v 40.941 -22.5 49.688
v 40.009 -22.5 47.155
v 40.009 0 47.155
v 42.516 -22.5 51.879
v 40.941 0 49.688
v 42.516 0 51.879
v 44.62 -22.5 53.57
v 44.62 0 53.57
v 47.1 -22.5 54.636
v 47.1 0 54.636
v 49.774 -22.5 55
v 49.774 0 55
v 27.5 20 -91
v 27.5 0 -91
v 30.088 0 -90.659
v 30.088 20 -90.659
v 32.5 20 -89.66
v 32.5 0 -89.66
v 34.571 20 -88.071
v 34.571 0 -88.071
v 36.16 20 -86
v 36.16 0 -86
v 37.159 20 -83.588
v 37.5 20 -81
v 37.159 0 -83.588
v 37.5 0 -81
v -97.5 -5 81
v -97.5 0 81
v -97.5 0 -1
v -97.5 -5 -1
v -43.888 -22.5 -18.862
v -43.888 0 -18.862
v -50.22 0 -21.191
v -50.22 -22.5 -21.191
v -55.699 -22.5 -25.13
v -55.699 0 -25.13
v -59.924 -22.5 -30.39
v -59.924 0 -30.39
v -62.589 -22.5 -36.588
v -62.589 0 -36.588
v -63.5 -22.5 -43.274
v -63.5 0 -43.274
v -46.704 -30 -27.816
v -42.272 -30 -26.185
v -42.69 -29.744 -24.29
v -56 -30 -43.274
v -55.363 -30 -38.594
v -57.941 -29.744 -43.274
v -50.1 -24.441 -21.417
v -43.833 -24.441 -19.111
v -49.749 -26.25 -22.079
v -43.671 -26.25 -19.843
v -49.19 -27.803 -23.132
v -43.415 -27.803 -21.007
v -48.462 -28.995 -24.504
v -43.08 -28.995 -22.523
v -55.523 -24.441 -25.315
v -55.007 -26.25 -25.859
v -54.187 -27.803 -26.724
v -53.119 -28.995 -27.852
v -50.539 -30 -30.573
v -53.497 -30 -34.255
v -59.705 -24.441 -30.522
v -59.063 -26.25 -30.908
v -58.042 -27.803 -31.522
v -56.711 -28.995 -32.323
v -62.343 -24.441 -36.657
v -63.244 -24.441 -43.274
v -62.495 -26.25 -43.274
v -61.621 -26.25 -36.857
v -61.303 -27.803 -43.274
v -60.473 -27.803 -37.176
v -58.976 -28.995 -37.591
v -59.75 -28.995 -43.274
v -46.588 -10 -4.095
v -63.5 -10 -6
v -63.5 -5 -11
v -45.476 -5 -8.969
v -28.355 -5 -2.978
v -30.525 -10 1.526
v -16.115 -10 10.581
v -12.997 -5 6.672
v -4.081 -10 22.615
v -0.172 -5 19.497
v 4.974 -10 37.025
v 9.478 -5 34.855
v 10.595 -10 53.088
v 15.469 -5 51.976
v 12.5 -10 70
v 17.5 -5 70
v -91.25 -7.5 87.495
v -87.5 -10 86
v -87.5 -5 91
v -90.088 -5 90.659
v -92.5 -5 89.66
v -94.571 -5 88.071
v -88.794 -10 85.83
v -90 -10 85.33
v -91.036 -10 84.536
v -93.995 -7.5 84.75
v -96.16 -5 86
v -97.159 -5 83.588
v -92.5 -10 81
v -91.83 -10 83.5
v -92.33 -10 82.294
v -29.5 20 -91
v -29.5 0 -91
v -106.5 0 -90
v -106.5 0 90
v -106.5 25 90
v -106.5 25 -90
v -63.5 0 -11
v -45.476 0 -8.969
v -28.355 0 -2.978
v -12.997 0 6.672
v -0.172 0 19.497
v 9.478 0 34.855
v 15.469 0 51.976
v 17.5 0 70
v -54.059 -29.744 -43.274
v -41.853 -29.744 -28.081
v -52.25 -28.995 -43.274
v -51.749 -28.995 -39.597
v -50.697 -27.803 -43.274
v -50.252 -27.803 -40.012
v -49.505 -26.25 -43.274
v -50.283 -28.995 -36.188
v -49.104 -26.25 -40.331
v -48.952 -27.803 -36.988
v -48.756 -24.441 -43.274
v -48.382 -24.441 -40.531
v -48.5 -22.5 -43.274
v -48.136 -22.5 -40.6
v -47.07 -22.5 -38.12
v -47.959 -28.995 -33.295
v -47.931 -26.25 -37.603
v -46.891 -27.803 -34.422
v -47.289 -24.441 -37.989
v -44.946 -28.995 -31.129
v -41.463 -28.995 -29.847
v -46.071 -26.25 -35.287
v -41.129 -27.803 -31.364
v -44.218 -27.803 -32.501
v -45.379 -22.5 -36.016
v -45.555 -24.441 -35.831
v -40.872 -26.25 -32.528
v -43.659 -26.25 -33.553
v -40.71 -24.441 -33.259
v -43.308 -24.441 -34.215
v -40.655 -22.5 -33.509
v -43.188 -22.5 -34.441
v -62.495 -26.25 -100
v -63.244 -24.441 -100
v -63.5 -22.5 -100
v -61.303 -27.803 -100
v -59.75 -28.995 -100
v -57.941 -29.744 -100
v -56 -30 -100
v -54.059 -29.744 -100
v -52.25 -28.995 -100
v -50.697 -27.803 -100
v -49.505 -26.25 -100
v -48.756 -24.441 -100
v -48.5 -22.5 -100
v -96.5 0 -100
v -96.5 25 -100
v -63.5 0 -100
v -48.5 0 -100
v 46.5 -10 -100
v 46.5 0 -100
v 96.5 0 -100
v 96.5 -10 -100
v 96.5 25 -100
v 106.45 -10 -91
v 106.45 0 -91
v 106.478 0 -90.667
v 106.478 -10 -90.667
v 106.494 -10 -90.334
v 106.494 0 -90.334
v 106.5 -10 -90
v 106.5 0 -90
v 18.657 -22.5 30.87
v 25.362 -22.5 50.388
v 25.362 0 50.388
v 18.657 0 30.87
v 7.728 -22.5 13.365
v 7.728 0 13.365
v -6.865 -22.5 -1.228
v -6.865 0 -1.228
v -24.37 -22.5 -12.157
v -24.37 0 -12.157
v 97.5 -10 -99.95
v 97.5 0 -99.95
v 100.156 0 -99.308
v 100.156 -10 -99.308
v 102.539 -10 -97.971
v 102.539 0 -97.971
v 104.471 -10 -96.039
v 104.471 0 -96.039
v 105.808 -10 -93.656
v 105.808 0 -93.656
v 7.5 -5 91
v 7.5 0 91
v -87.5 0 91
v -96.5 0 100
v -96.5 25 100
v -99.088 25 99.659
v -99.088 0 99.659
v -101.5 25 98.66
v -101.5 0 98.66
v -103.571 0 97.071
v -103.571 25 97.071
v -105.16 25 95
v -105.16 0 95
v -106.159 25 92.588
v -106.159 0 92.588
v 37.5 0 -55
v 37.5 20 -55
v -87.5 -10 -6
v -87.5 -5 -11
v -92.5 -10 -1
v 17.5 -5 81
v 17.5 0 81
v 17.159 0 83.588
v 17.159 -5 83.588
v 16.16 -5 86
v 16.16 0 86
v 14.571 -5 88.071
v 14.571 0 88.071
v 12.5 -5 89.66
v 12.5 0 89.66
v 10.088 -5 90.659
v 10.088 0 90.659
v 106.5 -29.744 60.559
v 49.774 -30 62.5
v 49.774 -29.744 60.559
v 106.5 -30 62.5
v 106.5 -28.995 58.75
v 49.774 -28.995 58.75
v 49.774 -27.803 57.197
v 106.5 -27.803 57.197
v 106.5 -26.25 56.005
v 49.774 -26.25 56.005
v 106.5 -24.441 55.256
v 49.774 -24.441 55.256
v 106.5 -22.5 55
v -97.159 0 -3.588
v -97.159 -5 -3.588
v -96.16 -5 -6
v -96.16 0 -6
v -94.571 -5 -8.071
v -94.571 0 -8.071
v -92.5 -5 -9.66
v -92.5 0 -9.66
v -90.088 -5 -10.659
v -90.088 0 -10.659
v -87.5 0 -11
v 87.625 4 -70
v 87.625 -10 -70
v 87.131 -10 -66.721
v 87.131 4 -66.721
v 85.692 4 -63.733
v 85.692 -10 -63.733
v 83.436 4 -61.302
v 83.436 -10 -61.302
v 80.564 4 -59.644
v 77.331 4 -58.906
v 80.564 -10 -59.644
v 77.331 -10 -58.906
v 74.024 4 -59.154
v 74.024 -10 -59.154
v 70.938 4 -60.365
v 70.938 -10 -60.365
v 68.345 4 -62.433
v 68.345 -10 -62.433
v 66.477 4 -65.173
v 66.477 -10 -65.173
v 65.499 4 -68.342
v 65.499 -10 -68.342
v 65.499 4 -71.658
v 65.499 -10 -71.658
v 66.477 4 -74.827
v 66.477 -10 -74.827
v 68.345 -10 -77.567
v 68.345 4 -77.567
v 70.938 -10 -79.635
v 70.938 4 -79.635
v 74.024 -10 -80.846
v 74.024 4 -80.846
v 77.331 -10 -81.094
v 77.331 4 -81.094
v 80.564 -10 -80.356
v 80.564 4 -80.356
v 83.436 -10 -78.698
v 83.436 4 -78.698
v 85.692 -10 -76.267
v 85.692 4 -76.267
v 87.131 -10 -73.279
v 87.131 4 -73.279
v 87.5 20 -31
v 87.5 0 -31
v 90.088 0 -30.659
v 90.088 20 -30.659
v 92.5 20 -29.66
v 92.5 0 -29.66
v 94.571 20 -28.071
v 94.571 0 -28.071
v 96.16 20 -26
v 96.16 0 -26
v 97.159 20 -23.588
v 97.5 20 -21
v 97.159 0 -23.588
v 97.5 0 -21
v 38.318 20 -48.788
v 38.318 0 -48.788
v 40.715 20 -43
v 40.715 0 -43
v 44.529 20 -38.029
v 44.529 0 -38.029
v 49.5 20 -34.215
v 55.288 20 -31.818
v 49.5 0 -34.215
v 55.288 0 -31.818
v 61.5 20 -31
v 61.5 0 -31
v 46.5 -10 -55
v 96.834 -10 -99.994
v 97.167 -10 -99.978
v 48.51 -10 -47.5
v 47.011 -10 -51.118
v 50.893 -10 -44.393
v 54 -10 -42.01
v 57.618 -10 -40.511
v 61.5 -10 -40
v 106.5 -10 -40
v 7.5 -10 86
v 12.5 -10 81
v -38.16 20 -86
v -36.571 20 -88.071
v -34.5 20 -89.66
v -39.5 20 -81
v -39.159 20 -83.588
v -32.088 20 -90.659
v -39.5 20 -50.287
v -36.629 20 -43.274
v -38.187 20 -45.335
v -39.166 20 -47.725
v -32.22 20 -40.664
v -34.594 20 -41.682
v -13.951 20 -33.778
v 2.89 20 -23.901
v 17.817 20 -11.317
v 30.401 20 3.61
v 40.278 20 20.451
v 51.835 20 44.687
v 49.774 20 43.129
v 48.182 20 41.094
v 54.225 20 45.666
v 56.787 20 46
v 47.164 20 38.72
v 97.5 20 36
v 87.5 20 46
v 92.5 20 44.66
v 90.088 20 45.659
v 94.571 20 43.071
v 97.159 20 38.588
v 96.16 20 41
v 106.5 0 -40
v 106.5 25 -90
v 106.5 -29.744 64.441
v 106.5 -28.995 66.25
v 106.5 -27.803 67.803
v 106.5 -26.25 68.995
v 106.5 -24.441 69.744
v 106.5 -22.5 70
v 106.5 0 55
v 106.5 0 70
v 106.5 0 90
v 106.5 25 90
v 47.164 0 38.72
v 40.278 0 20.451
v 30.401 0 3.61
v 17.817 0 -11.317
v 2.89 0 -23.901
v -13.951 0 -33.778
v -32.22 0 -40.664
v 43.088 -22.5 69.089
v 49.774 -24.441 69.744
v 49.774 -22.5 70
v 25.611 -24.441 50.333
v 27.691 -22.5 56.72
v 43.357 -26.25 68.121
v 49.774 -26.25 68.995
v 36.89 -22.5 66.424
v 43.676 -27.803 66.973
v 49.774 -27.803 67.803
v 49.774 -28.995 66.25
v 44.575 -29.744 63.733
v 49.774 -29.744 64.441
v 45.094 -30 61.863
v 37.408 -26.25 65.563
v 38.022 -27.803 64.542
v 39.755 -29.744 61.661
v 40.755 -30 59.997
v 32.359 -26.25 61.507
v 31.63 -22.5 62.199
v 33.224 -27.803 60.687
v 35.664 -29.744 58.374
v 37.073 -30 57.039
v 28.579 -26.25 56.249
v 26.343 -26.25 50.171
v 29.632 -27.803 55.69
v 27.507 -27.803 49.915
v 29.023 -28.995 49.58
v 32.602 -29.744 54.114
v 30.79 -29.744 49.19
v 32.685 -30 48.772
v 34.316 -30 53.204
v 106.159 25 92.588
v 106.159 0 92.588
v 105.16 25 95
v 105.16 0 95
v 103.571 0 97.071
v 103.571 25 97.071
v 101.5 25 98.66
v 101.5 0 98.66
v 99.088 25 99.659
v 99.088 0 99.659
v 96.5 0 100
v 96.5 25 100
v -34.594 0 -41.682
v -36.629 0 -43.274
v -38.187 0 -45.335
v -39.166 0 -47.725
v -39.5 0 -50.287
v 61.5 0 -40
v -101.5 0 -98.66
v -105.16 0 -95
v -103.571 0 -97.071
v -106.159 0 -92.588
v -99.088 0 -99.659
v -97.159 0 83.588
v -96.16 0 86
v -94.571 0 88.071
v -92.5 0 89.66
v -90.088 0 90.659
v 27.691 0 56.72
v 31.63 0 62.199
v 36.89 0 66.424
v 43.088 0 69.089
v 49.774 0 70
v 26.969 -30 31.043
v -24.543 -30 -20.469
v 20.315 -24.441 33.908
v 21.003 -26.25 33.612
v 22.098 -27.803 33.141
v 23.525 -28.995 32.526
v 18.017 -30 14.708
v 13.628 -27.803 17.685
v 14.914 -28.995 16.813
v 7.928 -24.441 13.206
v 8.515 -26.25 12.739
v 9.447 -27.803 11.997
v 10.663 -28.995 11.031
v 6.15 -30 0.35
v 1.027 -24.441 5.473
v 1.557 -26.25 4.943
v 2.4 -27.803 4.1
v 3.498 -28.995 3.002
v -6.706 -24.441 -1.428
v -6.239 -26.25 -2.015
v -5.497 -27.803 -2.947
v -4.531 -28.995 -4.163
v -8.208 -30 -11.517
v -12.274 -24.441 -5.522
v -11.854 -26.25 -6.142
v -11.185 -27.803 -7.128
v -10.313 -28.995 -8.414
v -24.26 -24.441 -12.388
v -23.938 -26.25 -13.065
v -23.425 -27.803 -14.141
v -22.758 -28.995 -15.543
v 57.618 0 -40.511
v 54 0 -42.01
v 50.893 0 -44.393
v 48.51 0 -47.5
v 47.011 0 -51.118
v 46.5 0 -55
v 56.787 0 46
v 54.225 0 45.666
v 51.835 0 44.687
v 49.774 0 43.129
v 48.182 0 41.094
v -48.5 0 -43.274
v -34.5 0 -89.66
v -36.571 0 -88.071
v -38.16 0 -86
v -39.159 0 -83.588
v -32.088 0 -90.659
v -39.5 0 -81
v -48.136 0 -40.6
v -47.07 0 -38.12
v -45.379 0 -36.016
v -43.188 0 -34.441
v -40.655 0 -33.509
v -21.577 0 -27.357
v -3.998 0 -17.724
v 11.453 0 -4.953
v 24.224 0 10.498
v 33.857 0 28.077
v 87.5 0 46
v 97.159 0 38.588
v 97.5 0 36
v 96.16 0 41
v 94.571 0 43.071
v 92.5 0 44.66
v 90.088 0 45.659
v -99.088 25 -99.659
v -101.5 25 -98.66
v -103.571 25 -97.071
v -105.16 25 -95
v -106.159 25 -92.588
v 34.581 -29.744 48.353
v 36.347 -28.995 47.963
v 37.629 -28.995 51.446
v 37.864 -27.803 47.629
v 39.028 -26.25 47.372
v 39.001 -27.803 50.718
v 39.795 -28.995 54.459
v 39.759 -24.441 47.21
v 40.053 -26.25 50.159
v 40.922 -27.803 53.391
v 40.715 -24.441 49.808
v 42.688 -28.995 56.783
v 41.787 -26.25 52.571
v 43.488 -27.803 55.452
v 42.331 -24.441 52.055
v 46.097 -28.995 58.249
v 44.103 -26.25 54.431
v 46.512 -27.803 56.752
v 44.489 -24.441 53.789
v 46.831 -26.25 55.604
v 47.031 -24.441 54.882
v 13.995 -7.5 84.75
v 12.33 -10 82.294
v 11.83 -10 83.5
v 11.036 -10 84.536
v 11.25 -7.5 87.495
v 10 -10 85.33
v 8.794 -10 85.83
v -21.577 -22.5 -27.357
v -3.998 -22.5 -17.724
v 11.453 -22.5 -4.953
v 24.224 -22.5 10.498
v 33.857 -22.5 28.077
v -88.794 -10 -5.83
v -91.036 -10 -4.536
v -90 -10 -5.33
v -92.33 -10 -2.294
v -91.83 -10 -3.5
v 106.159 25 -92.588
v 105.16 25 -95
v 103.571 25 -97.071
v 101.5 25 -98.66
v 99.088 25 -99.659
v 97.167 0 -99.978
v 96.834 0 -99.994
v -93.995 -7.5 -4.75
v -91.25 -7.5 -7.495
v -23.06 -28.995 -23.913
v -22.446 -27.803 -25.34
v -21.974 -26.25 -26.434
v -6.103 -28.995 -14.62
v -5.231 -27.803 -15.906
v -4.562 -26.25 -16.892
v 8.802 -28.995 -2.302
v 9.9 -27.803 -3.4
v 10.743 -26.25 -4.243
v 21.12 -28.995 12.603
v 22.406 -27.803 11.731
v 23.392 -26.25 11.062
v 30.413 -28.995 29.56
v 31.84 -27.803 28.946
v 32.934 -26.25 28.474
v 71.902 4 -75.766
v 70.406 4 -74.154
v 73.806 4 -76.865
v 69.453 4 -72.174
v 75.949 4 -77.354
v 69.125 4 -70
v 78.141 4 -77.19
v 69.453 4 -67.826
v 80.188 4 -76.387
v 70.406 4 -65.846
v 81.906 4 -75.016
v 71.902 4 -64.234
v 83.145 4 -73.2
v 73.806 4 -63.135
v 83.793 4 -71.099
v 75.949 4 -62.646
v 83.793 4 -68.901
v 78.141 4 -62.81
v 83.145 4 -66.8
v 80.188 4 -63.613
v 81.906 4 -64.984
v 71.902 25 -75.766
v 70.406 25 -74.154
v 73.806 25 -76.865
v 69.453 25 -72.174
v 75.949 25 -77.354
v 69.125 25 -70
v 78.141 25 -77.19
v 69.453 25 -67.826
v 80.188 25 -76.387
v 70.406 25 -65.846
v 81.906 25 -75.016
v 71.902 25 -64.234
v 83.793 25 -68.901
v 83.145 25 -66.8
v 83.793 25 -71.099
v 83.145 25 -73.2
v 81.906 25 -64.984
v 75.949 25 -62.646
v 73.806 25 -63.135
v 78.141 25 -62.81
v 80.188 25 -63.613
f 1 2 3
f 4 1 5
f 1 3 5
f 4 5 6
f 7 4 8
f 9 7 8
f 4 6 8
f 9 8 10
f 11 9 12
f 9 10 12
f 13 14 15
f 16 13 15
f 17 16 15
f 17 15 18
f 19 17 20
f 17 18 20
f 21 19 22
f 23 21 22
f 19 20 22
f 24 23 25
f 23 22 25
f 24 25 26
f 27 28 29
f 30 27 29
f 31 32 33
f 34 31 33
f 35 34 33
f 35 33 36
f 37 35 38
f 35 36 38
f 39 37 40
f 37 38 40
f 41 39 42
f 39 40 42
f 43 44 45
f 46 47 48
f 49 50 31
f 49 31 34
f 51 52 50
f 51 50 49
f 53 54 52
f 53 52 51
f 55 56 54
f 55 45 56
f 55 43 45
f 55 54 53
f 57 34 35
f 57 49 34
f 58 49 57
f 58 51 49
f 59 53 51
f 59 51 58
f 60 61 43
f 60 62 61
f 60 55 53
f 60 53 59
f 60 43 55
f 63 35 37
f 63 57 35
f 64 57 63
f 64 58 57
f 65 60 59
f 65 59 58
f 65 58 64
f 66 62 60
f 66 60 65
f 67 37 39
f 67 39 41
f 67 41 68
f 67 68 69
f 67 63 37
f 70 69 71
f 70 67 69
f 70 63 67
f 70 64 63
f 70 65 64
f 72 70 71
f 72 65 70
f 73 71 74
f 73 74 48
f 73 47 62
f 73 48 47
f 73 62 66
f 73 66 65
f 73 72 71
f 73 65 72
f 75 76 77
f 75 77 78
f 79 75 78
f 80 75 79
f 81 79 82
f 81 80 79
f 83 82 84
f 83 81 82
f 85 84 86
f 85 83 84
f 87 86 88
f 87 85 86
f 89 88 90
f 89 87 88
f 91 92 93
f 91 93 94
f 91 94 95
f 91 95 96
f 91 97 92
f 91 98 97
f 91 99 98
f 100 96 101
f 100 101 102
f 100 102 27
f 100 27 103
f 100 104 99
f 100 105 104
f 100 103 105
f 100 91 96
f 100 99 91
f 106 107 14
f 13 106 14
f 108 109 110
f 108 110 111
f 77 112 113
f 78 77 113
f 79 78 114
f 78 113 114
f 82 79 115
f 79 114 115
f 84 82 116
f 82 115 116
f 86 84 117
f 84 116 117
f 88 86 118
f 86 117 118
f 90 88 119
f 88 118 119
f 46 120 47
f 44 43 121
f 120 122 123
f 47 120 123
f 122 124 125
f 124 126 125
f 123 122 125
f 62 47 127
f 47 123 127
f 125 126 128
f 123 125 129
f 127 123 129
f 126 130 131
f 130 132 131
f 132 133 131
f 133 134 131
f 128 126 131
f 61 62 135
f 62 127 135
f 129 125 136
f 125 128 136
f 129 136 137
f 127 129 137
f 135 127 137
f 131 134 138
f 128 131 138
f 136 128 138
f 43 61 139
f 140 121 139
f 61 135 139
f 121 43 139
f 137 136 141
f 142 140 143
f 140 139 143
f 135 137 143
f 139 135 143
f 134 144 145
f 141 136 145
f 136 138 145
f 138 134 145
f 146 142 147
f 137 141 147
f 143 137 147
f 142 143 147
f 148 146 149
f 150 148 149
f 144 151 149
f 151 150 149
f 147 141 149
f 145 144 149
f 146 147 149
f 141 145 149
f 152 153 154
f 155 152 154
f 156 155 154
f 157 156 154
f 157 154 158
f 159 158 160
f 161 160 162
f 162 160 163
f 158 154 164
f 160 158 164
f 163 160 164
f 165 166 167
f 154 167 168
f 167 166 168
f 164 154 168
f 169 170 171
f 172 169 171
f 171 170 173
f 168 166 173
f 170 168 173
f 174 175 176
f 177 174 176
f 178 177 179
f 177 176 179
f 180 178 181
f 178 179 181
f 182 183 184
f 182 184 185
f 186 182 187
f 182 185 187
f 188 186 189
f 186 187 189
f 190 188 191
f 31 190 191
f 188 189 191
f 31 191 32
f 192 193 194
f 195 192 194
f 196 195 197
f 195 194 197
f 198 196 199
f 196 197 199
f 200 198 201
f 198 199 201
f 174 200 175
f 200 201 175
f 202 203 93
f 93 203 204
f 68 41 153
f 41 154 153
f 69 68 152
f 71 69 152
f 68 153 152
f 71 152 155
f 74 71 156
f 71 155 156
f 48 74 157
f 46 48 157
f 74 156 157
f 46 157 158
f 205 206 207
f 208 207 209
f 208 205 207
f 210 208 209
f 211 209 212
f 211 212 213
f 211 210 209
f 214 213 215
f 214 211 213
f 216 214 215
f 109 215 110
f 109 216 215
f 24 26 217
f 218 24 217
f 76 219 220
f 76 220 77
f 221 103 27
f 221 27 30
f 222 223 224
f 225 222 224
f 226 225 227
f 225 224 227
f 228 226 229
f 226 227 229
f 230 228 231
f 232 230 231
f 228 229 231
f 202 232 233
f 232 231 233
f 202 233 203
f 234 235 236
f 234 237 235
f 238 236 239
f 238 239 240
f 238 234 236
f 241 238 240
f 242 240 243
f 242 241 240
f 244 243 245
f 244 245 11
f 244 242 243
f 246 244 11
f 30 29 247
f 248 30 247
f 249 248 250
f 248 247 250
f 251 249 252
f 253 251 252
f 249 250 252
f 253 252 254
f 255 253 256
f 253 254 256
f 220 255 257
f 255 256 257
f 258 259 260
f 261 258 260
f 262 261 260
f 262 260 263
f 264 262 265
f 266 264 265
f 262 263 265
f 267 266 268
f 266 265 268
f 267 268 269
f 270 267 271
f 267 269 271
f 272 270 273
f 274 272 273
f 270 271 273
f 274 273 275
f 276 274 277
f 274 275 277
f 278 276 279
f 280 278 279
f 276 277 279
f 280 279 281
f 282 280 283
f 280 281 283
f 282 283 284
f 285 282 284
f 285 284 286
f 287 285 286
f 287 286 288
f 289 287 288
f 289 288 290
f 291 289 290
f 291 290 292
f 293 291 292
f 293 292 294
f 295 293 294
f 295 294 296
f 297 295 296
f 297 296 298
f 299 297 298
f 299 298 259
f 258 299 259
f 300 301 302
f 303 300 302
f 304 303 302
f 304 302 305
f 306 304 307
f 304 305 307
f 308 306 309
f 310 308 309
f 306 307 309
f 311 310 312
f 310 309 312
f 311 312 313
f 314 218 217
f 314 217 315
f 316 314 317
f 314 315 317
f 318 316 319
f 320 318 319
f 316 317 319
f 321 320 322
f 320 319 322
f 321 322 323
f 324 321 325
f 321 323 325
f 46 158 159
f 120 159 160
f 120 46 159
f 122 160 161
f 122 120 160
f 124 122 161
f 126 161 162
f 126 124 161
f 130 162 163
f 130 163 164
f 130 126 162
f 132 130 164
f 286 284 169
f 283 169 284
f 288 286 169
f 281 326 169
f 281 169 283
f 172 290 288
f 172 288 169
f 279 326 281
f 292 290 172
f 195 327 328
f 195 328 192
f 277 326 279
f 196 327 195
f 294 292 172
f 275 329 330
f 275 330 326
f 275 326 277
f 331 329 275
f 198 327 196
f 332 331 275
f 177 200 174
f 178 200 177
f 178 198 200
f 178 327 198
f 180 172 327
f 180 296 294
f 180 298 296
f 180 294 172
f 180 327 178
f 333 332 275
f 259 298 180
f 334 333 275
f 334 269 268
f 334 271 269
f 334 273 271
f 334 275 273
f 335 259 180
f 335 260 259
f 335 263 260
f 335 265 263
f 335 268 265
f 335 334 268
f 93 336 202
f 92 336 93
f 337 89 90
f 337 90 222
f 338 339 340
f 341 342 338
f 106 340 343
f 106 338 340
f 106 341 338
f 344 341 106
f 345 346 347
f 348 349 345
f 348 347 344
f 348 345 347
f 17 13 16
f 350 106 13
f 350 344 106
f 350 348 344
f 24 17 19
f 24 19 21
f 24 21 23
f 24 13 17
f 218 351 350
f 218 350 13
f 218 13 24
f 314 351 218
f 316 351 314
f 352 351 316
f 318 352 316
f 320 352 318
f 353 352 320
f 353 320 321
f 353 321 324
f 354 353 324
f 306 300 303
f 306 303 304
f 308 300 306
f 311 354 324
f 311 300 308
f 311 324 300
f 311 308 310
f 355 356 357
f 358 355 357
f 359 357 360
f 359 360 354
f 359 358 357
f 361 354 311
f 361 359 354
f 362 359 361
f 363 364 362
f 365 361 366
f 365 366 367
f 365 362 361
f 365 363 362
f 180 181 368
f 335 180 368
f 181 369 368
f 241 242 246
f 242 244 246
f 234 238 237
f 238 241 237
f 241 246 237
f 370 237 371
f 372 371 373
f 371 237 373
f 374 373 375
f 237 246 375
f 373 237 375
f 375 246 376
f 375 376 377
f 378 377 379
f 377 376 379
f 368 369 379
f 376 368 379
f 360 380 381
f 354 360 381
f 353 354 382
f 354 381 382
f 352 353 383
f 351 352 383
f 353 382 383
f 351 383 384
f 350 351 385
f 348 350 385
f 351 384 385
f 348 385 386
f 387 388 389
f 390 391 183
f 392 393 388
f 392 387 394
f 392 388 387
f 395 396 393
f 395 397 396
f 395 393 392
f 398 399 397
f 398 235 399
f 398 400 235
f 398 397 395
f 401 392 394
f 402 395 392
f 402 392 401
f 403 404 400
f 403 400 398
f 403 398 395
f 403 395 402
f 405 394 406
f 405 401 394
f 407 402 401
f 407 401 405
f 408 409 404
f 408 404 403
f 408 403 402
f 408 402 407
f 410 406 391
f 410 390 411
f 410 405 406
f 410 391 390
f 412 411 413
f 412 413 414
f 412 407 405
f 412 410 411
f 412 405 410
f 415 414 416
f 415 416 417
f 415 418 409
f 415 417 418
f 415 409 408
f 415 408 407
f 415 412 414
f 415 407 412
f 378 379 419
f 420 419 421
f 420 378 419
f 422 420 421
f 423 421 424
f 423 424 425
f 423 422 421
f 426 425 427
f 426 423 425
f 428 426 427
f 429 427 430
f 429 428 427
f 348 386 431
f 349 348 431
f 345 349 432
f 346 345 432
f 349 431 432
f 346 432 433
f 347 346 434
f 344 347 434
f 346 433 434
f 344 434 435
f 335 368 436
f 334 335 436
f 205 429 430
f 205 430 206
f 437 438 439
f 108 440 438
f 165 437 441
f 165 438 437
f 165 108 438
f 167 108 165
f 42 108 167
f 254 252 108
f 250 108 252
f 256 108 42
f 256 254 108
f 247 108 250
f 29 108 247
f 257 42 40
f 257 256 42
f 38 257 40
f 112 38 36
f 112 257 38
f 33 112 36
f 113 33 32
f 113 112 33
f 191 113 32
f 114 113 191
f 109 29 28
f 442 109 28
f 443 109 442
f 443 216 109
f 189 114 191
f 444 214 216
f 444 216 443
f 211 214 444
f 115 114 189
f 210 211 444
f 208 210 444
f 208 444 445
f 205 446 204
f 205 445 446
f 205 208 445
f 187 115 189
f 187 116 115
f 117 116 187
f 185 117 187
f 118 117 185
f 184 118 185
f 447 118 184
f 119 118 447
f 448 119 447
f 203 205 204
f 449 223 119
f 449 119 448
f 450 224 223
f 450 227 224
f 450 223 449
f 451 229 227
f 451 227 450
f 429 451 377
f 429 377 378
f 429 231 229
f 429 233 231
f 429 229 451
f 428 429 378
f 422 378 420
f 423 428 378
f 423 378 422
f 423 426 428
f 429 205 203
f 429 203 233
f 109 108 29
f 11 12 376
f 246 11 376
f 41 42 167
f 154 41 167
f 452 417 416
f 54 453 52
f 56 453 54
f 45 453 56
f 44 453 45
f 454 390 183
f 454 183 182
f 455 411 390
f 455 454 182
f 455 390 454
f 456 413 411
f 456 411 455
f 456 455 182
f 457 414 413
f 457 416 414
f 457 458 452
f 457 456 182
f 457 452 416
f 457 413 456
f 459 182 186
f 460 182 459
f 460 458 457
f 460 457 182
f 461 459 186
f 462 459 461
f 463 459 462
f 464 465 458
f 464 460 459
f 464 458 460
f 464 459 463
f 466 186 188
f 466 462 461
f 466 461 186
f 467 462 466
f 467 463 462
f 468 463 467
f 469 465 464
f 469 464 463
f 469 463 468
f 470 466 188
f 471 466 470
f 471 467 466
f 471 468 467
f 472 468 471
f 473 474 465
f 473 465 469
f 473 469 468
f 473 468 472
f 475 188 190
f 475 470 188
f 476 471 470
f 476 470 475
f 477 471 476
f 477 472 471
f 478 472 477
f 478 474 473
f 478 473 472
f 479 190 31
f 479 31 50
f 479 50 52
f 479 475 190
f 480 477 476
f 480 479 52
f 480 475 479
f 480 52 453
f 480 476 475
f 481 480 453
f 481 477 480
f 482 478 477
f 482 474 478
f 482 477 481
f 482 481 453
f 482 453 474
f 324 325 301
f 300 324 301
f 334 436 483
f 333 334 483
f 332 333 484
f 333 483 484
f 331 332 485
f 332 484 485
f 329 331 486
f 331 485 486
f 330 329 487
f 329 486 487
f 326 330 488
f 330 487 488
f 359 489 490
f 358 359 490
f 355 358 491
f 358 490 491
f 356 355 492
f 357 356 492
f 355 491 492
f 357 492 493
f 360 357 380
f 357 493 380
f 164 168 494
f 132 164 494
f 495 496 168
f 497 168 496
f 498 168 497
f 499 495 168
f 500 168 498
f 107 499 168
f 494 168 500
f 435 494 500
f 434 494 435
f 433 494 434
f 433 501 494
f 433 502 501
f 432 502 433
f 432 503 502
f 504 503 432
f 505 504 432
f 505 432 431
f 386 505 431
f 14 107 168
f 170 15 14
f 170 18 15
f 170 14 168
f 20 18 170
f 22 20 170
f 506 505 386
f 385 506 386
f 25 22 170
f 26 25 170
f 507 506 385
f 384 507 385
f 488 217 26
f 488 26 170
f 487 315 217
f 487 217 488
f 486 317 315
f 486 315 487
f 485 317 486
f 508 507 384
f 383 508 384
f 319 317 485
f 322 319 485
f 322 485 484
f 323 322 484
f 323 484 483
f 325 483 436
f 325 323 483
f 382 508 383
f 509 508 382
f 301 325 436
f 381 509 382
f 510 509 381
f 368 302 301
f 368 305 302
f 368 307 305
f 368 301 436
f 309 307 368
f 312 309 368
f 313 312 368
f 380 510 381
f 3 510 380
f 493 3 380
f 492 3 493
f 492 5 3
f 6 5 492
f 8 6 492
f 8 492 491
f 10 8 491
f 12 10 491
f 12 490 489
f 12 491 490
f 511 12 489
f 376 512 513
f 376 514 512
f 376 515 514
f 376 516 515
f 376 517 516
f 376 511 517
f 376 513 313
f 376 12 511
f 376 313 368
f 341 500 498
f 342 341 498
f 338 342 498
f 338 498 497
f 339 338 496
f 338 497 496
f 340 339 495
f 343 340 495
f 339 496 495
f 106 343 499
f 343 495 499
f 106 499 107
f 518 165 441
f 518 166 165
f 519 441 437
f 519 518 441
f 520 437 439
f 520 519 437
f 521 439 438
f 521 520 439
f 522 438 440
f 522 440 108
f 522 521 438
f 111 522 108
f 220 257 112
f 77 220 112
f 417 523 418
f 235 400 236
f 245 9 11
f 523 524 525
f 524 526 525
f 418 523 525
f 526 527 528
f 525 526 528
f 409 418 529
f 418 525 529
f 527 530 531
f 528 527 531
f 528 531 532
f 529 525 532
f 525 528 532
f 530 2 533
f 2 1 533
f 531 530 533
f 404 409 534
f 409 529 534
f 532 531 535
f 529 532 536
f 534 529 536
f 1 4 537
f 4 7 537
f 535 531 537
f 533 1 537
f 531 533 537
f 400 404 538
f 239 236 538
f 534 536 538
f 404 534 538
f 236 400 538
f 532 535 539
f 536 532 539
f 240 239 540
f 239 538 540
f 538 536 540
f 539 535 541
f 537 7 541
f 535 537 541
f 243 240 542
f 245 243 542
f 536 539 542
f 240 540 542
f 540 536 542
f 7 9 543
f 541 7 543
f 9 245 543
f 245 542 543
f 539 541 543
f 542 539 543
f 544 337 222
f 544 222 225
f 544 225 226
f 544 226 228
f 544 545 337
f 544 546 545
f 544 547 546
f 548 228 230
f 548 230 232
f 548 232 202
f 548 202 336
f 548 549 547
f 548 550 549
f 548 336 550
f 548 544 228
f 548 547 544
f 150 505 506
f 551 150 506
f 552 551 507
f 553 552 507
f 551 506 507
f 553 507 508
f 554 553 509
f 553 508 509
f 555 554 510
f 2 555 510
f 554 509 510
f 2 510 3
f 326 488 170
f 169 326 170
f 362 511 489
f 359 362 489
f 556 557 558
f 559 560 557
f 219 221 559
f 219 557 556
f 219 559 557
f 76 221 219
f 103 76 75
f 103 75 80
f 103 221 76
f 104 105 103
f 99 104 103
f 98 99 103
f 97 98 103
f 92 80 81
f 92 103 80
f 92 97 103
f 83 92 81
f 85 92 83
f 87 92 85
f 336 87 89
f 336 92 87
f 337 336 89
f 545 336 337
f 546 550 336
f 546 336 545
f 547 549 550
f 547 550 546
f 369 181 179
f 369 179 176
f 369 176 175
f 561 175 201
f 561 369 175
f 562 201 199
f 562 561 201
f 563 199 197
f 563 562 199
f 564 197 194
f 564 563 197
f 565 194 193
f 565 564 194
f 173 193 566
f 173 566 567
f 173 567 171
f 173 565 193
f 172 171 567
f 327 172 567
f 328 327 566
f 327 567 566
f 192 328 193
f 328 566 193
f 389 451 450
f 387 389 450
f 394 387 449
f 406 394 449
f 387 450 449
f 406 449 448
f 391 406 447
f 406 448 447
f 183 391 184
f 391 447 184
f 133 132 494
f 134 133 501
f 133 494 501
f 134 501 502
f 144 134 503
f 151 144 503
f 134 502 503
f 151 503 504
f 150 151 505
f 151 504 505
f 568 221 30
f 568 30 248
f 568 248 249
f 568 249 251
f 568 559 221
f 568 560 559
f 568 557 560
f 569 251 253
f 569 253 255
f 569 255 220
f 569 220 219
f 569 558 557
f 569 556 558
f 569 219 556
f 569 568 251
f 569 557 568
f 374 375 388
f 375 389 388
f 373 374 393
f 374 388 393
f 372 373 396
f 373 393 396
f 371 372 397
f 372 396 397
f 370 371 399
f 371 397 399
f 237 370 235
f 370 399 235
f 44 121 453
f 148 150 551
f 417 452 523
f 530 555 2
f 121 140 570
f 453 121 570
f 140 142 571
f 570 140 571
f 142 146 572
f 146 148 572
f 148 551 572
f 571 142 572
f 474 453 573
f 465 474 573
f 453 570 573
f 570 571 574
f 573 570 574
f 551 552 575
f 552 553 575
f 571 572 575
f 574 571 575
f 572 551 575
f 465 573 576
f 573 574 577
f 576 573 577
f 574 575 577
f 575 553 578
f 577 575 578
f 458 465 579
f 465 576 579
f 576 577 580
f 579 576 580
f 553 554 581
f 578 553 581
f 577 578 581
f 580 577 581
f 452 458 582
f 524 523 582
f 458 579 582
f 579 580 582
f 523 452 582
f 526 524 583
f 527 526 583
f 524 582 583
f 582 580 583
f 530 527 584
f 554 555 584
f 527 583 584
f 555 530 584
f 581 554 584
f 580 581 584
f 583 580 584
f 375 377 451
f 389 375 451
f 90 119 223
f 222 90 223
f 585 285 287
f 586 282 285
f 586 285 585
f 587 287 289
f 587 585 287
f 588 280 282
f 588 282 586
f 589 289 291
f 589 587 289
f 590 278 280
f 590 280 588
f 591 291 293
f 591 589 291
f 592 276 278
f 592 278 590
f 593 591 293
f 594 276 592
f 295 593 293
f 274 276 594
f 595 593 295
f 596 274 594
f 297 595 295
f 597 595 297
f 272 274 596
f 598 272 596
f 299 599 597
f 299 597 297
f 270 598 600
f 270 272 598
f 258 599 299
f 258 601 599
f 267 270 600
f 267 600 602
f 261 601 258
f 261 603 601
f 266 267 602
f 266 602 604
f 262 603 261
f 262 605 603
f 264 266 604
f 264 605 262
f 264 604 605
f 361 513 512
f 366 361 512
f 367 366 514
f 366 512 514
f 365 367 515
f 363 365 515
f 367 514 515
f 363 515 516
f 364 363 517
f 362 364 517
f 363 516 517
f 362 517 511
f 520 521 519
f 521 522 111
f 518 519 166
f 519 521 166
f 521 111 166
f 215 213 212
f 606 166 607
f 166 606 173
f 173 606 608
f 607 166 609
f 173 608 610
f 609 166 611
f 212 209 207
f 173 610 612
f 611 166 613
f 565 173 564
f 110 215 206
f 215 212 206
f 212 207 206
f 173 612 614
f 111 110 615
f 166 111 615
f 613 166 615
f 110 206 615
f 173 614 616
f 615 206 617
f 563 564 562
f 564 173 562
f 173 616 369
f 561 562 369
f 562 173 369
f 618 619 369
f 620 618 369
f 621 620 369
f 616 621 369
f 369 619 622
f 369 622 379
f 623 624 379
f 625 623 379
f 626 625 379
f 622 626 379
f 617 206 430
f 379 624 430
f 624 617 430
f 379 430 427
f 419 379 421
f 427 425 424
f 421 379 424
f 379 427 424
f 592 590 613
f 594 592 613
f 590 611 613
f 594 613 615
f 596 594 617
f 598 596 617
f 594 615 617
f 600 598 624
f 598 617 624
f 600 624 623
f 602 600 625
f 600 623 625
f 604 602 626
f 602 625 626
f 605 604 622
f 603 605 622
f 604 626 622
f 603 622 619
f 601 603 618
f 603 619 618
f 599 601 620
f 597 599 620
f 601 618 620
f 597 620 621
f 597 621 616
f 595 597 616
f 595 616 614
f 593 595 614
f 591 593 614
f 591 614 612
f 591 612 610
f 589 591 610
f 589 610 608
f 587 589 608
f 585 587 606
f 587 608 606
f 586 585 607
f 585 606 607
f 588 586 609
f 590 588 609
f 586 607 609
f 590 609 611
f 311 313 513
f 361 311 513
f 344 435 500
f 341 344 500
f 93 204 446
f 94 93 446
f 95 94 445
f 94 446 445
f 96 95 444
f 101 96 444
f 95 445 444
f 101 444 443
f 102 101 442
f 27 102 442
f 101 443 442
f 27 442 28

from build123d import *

# Parameters (mm, degrees)
F1_DEPTH        = 25
F2_DEPTH        = 10
F3_DEPTH        = 20
F4_DEPTH        = 30
F5_R            = 7.49999
F6_SIZE         = 5
F7_R            = 10
F8_DEPTH        = 10
F10_D           = 14.75
F10_CBORE_D     = 22.25
F10_CBORE_DEPTH = 14


# Not quite as in the source:
# - a fillet or chamfer is up to 0.001 mm smaller than in the source, because OpenCascade refuses the exact size


with BuildPart() as f1:
    # F0 (on Front) → F1 (new body)
    with BuildSketch(Plane.XZ):
        with BuildLine():
            Line((96.5, 100), (-96.5, 100))
            ThreePointArc((-96.5, 100), (-103.5710678119, 97.0710678119), (-106.5, 90))
            Line((-106.5, 90), (-106.5, -90))
            ThreePointArc((-106.5, -90), (-103.5710678119, -97.0710678119), (-96.5, -100))
            Line((-96.5, -100), (-63.5, -100))
            Line((-63.5, -100), (-63.5, -43.2740040786))
            ThreePointArc((-63.5, -43.2740040786), (-57.9897187751, -27.6167098657), (-43.8879310345, -18.8615031996))
            ThreePointArc((-43.8879310345, -18.8615031996), (0.846717088, 5.653282912), (25.3615031996, 50.3879310345))
            ThreePointArc((25.3615031996, 50.3879310345), (34.1167098657, 64.4897187751), (49.7740040786, 70))
            Line((49.7740040786, 70), (106.5, 70))
            Line((106.5, 70), (106.5, 90))
            ThreePointArc((106.5, 90), (103.5710678119, 97.0710678119), (96.5, 100))
        make_face()
        with BuildLine():
            ThreePointArc((17.5, 70), (-6.2243507239, 12.7243507239), (-63.5, -11))
            Line((-63.5, -11), (-87.5, -11))
            ThreePointArc((-87.5, -11), (-94.5710678119, -8.0710678119), (-97.5, -1))
            Line((-97.5, -1), (-97.5, 81))
            ThreePointArc((-97.5, 81), (-94.5710678119, 88.0710678119), (-87.5, 91))
            Line((-87.5, 91), (7.5, 91))
            ThreePointArc((7.5, 91), (14.5710678119, 88.0710678119), (17.5, 81))
            Line((17.5, 81), (17.5, 70))
        make_face(mode=Mode.SUBTRACT)
        with BuildLine():
            ThreePointArc((-96.5, -100), (-103.5710678119, -97.0710678119), (-106.5, -90))
            Line((-106.5, -90), (-106.5, -100))
            Line((-106.5, -100), (-96.5, -100))
        make_face()
        with BuildLine():
            Line((106.5, 55), (106.5, 70))
            Line((106.5, 70), (49.7740040786, 70))
            ThreePointArc((49.7740040786, 70), (34.1167098657, 64.4897187751), (25.3615031996, 50.3879310345))
            ThreePointArc((25.3615031996, 50.3879310345), (0.846717088, 5.653282912), (-43.8879310345, -18.8615031996))
            ThreePointArc((-43.8879310345, -18.8615031996), (-57.9897187751, -27.6167098657), (-63.5, -43.2740040786))
            Line((-63.5, -43.2740040786), (-63.5, -100))
            Line((-63.5, -100), (-48.5, -100))
            Line((-48.5, -100), (-48.5, -43.2740040786))
            ThreePointArc((-48.5, -43.2740040786), (-46.29588751, -37.0110863935), (-40.6551724138, -33.509003727))
            ThreePointArc((-40.6551724138, -33.509003727), (11.4533188058, -4.9533188058), (40.009003727, 47.1551724138))
            ThreePointArc((40.009003727, 47.1551724138), (43.5110863935, 52.79588751), (49.7740040786, 55))
            Line((49.7740040786, 55), (106.5, 55))
        make_face()
        with BuildLine():
            Line((106.5, -40), (106.5, 55))
            Line((106.5, 55), (49.7740040786, 55))
            ThreePointArc((49.7740040786, 55), (43.5110863935, 52.79588751), (40.009003727, 47.1551724138))
            ThreePointArc((40.009003727, 47.1551724138), (11.4533188058, -4.9533188058), (-40.6551724138, -33.509003727))
            ThreePointArc((-40.6551724138, -33.509003727), (-46.29588751, -37.0110863935), (-48.5, -43.2740040786))
            Line((-48.5, -43.2740040786), (-48.5, -100))
            Line((-48.5, -100), (46.5, -100))
            Line((46.5, -100), (46.5, -55))
            ThreePointArc((46.5, -55), (50.8933982822, -44.3933982822), (61.5, -40))
            Line((61.5, -40), (106.5, -40))
        make_face()
        with BuildLine():
            Line((56.7871564216, 46), (87.5, 46))
            ThreePointArc((87.5, 46), (94.5710678119, 43.0710678119), (97.5, 36))
            Line((97.5, 36), (97.5, -21))
            ThreePointArc((97.5, -21), (94.5710678119, -28.0710678119), (87.5, -31))
            Line((87.5, -31), (61.5, -31))
            ThreePointArc((61.5, -31), (44.5294372515, -38.0294372515), (37.5, -55))
            Line((37.5, -55), (37.5, -81))
            ThreePointArc((37.5, -81), (34.5710678119, -88.0710678119), (27.5, -91))
            Line((27.5, -91), (-29.5, -91))
            ThreePointArc((-29.5, -91), (-36.5710678119, -88.0710678119), (-39.5, -81))
            Line((-39.5, -81), (-39.5, -50.2871564216))
            ThreePointArc((-39.5, -50.2871564216), (-37.474960815, -44.25391517), (-32.22, -40.6641839079))
            ThreePointArc((-32.22, -40.6641839079), (17.8172798365, -11.3172798365), (47.1641839079, 38.72))
            ThreePointArc((47.1641839079, 38.72), (50.75391517, 43.974960815), (56.7871564216, 46))
        make_face(mode=Mode.SUBTRACT)
        with BuildLine():
            Line((106.5, -90), (106.5, -40))
            Line((106.5, -40), (61.5, -40))
            ThreePointArc((61.5, -40), (50.8933982822, -44.3933982822), (46.5, -55))
            Line((46.5, -55), (46.5, -100))
            Line((46.5, -100), (96.5, -100))
            ThreePointArc((96.5, -100), (97.0006277506, -99.9874607311), (97.5, -99.9498743711))
            ThreePointArc((97.5, -99.9498743711), (103.5710678119, -97.0710678119), (106.4498743711, -91))
            ThreePointArc((106.4498743711, -91), (106.4874607311, -90.5006277506), (106.5, -90))
        make_face()
        with BuildLine():
            Line((106.5, -91), (106.5, -90))
            ThreePointArc((106.5, -90), (106.4874607311, -90.5006277506), (106.4498743711, -91))
            Line((106.4498743711, -91), (106.5, -91))
        make_face()
        with BuildLine():
            Line((106.5, -91), (106.4498743711, -91))
            ThreePointArc((106.4498743711, -91), (103.5710678119, -97.0710678119), (97.5, -99.9498743711))
            Line((97.5, -99.9498743711), (97.5, -100))
            Line((97.5, -100), (106.5, -100))
            Line((106.5, -100), (106.5, -91))
        make_face()
        with BuildLine():
            ThreePointArc((97.5, -99.9498743711), (97.0006277506, -99.9874607311), (96.5, -100))
            Line((96.5, -100), (97.5, -100))
            Line((97.5, -100), (97.5, -99.9498743711))
        make_face()
        with BuildLine():
            Line((-87.5, -11), (-63.5, -11))
            ThreePointArc((-63.5, -11), (-6.2243507239, 12.7243507239), (17.5, 70))
            Line((17.5, 70), (17.5, 81))
            ThreePointArc((17.5, 81), (14.5710678119, 88.0710678119), (7.5, 91))
            Line((7.5, 91), (-87.5, 91))
            ThreePointArc((-87.5, 91), (-94.5710678119, 88.0710678119), (-97.5, 81))
            Line((-97.5, 81), (-97.5, -1))
            ThreePointArc((-97.5, -1), (-94.5710678119, -8.0710678119), (-87.5, -11))
        make_face()
        with BuildLine():
            ThreePointArc((97.5, 36), (94.5710678119, 43.0710678119), (87.5, 46))
            Line((87.5, 46), (56.7871564216, 46))
            ThreePointArc((56.7871564216, 46), (50.75391517, 43.974960815), (47.1641839079, 38.72))
            ThreePointArc((47.1641839079, 38.72), (17.8172798365, -11.3172798365), (-32.22, -40.6641839079))
            ThreePointArc((-32.22, -40.6641839079), (-37.474960815, -44.25391517), (-39.5, -50.2871564216))
            Line((-39.5, -50.2871564216), (-39.5, -81))
            ThreePointArc((-39.5, -81), (-36.5710678119, -88.0710678119), (-29.5, -91))
            Line((-29.5, -91), (27.5, -91))
            ThreePointArc((27.5, -91), (34.5710678119, -88.0710678119), (37.5, -81))
            Line((37.5, -81), (37.5, -55))
            ThreePointArc((37.5, -55), (44.5294372515, -38.0294372515), (61.5, -31))
            Line((61.5, -31), (87.5, -31))
            ThreePointArc((87.5, -31), (94.5710678119, -28.0710678119), (97.5, -21))
            Line((97.5, -21), (97.5, 36))
        make_face()
    extrude(amount=-F1_DEPTH)

    # F0 (on Front) → F2 (join)
    with BuildSketch(Plane.XZ):
        with BuildLine():
            Line((-87.5, -11), (-63.5, -11))
            ThreePointArc((-63.5, -11), (-6.2243507239, 12.7243507239), (17.5, 70))
            Line((17.5, 70), (17.5, 81))
            ThreePointArc((17.5, 81), (14.5710678119, 88.0710678119), (7.5, 91))
            Line((7.5, 91), (-87.5, 91))
            ThreePointArc((-87.5, 91), (-94.5710678119, 88.0710678119), (-97.5, 81))
            Line((-97.5, 81), (-97.5, -1))
            ThreePointArc((-97.5, -1), (-94.5710678119, -8.0710678119), (-87.5, -11))
        make_face()
    extrude(amount=F2_DEPTH)

    # F0 (on Front) → F3 (cut)
    with BuildSketch(Plane.XZ):
        with BuildLine():
            ThreePointArc((97.5, 36), (94.5710678119, 43.0710678119), (87.5, 46))
            Line((87.5, 46), (56.7871564216, 46))
            ThreePointArc((56.7871564216, 46), (50.75391517, 43.974960815), (47.1641839079, 38.72))
            ThreePointArc((47.1641839079, 38.72), (17.8172798365, -11.3172798365), (-32.22, -40.6641839079))
            ThreePointArc((-32.22, -40.6641839079), (-37.474960815, -44.25391517), (-39.5, -50.2871564216))
            Line((-39.5, -50.2871564216), (-39.5, -81))
            ThreePointArc((-39.5, -81), (-36.5710678119, -88.0710678119), (-29.5, -91))
            Line((-29.5, -91), (27.5, -91))
            ThreePointArc((27.5, -91), (34.5710678119, -88.0710678119), (37.5, -81))
            Line((37.5, -81), (37.5, -55))
            ThreePointArc((37.5, -55), (44.5294372515, -38.0294372515), (61.5, -31))
            Line((61.5, -31), (87.5, -31))
            ThreePointArc((87.5, -31), (94.5710678119, -28.0710678119), (97.5, -21))
            Line((97.5, -21), (97.5, 36))
        make_face()
    extrude(amount=-F3_DEPTH, mode=Mode.SUBTRACT)

    # F0 (on Front) → F4 (join)
    with BuildSketch(Plane.XZ):
        with BuildLine():
            Line((106.5, 55), (106.5, 70))
            Line((106.5, 70), (49.7740040786, 70))
            ThreePointArc((49.7740040786, 70), (34.1167098657, 64.4897187751), (25.3615031996, 50.3879310345))
            ThreePointArc((25.3615031996, 50.3879310345), (0.846717088, 5.653282912), (-43.8879310345, -18.8615031996))
            ThreePointArc((-43.8879310345, -18.8615031996), (-57.9897187751, -27.6167098657), (-63.5, -43.2740040786))
            Line((-63.5, -43.2740040786), (-63.5, -100))
            Line((-63.5, -100), (-48.5, -100))
            Line((-48.5, -100), (-48.5, -43.2740040786))
            ThreePointArc((-48.5, -43.2740040786), (-46.29588751, -37.0110863935), (-40.6551724138, -33.509003727))
            ThreePointArc((-40.6551724138, -33.509003727), (11.4533188058, -4.9533188058), (40.009003727, 47.1551724138))
            ThreePointArc((40.009003727, 47.1551724138), (43.5110863935, 52.79588751), (49.7740040786, 55))
            Line((49.7740040786, 55), (106.5, 55))
        make_face()
    extrude(amount=F4_DEPTH)

    # F5 (radius 7.5 in the source; OpenCascade refuses exactly that, so slightly less here)
    f5_edges = [f1.edges().sort_by_distance(p)[0] for p in [
        (-63.5, -30, -71.637002),
        (-48.5, -30, -71.637002),
    ]]
    fillet(f5_edges, radius=F5_R)

    # F6
    f6_edges = [f1.edges().sort_by_distance(p)[0] for p in [
        (-97.5, -10, 40),
    ]]
    chamfer(f6_edges, length=F6_SIZE)

    # F7
    f7_edges = [f1.edges().sort_by_distance(p)[0] for p in [
        (-106.5, 12.5, -100),
        (106.5, 12.5, -100),
    ]]
    fillet(f7_edges, radius=F7_R)

    # F0 (on Front) → F8 (join)
    with BuildSketch(Plane.XZ):
        with BuildLine():
            Line((106.5, -90), (106.5, -40))
            Line((106.5, -40), (61.5, -40))
            ThreePointArc((61.5, -40), (50.8933982822, -44.3933982822), (46.5, -55))
            Line((46.5, -55), (46.5, -100))
            Line((46.5, -100), (96.5, -100))
            ThreePointArc((96.5, -100), (97.0006277506, -99.9874607311), (97.5, -99.9498743711))
            ThreePointArc((97.5, -99.9498743711), (103.5710678119, -97.0710678119), (106.4498743711, -91))
            ThreePointArc((106.4498743711, -91), (106.4874607311, -90.5006277506), (106.5, -90))
        make_face()
    extrude(amount=F8_DEPTH)

    # F10 (through all)
    with Locations(Plane.XZ.offset(10)):
        with Locations((76.5, -70)):
            CounterBoreHole(F10_D / 2, F10_CBORE_D / 2, F10_CBORE_DEPTH)


solid = f1.part
